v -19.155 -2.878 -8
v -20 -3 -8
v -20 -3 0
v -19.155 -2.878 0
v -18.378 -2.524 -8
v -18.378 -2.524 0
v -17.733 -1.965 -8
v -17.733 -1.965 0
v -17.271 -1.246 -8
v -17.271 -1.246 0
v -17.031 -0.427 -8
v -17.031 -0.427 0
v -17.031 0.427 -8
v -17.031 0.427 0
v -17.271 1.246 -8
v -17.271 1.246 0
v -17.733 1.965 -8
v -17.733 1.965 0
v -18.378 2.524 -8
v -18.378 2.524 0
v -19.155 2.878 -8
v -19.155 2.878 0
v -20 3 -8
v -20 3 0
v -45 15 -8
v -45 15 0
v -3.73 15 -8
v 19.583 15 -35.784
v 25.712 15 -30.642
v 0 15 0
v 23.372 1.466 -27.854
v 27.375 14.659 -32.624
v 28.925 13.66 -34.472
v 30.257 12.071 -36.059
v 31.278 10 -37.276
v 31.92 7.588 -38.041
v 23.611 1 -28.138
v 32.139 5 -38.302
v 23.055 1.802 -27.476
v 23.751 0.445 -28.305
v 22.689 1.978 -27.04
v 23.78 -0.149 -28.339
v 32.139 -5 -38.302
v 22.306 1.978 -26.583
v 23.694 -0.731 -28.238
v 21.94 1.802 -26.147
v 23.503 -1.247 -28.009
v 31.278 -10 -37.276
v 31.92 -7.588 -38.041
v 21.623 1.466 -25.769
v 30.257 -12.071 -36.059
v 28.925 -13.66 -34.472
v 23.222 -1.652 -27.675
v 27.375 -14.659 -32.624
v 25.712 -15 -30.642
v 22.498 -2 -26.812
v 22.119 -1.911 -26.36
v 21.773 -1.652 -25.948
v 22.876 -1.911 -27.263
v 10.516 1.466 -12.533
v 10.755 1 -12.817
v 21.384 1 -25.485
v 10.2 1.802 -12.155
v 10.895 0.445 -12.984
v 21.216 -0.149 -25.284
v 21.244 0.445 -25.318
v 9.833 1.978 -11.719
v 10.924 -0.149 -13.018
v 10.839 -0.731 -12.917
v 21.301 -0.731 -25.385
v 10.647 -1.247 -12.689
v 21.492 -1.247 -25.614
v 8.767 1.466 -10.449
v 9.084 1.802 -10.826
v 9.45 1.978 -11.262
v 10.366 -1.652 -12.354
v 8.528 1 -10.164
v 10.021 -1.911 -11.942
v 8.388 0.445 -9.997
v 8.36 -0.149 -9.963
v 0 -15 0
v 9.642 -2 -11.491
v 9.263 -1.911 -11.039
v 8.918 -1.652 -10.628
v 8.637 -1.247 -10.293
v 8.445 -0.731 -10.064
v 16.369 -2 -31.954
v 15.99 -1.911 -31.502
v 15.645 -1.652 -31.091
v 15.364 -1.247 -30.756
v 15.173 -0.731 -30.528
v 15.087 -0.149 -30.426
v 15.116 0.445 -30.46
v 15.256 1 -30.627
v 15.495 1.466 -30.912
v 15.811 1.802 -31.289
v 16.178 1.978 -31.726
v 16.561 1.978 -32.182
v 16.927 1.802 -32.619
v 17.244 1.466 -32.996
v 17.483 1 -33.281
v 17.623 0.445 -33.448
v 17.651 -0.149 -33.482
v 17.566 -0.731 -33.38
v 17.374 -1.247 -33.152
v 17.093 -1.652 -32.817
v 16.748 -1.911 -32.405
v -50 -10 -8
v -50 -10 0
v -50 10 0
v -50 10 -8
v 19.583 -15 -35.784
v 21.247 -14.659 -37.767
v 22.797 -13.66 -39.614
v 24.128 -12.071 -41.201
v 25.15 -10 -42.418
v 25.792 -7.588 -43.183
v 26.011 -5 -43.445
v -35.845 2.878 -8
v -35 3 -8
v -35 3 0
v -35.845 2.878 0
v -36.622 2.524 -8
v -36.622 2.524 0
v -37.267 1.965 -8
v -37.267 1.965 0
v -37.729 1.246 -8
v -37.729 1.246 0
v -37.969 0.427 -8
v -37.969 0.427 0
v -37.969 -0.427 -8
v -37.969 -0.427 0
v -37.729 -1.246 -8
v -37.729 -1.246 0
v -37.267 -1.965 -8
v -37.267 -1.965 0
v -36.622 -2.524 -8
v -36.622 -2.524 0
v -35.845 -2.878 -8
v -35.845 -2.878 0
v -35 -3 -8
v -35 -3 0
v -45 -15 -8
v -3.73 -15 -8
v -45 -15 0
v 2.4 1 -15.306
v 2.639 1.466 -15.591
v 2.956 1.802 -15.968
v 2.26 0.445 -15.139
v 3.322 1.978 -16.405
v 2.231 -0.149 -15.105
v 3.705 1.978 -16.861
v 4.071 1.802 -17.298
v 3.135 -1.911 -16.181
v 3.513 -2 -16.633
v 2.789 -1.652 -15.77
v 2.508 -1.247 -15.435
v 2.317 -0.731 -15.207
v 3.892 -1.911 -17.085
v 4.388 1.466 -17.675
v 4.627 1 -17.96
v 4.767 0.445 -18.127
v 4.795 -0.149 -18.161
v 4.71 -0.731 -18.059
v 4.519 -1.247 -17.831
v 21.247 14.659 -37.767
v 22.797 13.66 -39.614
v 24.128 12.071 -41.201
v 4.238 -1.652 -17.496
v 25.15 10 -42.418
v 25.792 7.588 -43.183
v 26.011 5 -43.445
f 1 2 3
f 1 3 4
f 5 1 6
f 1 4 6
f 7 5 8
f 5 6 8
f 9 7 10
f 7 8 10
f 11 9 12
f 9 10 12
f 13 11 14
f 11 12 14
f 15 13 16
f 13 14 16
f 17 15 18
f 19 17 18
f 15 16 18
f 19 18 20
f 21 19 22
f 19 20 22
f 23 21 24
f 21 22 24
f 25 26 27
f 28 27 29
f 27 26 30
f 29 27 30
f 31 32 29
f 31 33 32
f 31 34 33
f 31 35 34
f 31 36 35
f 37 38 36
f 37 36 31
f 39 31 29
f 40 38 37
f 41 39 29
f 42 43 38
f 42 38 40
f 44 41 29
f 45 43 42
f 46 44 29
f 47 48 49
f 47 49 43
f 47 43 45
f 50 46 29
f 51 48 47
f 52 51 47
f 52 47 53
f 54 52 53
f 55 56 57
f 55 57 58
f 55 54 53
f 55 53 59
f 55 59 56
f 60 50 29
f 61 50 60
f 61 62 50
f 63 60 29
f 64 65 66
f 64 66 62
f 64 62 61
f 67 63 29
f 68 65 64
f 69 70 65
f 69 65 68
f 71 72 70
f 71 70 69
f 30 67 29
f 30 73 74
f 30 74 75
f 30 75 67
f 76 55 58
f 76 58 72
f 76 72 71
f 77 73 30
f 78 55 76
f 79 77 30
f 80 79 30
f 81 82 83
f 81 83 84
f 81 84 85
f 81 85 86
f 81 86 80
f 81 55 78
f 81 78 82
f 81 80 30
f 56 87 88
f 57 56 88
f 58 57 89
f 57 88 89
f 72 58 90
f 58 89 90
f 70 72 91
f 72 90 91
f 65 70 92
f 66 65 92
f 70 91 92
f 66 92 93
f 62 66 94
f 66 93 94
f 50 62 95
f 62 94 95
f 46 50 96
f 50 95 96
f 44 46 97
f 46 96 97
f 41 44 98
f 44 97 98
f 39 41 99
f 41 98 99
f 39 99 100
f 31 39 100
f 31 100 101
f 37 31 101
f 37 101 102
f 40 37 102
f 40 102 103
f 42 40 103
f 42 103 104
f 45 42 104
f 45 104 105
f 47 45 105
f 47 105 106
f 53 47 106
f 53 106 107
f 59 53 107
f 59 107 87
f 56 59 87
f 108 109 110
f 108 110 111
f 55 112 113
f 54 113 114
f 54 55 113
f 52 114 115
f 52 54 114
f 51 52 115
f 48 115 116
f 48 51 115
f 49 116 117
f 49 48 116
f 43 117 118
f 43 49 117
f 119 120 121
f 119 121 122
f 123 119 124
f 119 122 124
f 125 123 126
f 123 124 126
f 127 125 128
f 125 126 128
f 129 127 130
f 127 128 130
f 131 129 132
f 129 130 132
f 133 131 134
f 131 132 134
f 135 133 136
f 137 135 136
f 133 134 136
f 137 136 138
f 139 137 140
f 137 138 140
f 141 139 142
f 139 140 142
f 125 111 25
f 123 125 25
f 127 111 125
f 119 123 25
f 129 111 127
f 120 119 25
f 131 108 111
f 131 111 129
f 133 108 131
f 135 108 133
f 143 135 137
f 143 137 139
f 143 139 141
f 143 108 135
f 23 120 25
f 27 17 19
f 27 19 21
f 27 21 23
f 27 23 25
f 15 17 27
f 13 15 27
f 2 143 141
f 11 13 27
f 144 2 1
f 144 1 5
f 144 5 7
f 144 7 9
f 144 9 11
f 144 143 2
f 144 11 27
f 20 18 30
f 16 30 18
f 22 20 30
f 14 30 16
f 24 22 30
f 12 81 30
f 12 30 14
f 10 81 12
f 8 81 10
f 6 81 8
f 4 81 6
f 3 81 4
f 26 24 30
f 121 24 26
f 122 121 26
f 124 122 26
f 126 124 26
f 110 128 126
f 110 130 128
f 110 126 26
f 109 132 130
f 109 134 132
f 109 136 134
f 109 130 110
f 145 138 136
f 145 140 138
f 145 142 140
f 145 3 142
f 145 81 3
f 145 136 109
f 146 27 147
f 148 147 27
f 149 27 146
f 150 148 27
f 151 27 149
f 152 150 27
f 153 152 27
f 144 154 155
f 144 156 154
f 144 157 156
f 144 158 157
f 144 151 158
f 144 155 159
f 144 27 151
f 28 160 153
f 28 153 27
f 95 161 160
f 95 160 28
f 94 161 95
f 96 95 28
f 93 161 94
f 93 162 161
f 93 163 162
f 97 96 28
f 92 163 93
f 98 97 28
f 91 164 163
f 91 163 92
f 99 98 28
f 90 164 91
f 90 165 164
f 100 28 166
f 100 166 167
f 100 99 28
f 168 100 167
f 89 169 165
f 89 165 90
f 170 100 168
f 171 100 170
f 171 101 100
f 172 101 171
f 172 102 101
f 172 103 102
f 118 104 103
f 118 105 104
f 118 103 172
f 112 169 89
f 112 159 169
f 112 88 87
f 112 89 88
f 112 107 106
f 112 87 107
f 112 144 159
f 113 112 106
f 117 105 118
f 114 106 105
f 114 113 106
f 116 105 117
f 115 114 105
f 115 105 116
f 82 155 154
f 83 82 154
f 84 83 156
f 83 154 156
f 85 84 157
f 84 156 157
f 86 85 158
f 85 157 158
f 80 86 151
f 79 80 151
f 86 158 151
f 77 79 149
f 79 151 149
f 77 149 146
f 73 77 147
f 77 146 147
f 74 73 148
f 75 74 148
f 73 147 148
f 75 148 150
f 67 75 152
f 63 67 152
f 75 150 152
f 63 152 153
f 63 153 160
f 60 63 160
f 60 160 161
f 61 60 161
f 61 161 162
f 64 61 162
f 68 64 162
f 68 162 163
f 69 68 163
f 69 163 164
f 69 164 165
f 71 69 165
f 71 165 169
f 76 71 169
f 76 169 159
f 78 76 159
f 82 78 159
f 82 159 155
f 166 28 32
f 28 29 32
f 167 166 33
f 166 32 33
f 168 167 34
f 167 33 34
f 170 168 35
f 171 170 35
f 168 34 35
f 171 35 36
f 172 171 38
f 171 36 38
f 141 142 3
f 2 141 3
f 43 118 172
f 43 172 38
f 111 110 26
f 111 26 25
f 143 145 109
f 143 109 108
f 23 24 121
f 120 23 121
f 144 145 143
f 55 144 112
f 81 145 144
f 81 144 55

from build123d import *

# Parameters (mm, degrees)
F1_DEPTH = 15
F3_DEPTH = 43.4455230334
F5_D     = 4
F6_R     = 10
F7_SIZE  = 5


with BuildPart() as f1:
    # F0 (on Front) → F1 (new body, symmetric)
    with BuildSketch(Plane.XZ):
        Polygon((0, 0), (-50, 0), (-50, -8), (-3.7304612652, -8), (26.0110249394, -43.4445230334), (32.1393804843, -38.3022221559), align=None)
    extrude(amount=F1_DEPTH, both=True)

    # F2 (on face) → F3 (cut, through all)
    with BuildSketch(Plane.XY):
        with BuildLine():
            ThreePointArc((-35, 3), (-38, 0), (-35, -3))
            Line((-35, -3), (-20, -3))
            ThreePointArc((-20, -3), (-17, 0), (-20, 3))
            Line((-20, 3), (-35, 3))
        make_face()
    extrude(amount=-F3_DEPTH, mode=Mode.SUBTRACT)

    # F5 (through all)
    with Locations(Plane(origin=(0, 0, 0), x_dir=(0, 1, 0), z_dir=(0.7660444431, 0, 0.6427876097))):
        with Locations((0, -15), (0, -35)):
            Hole(F5_D / 2)

    # F6
    f6_edges = [f1.edges().sort_by_distance(p)[0] for p in [
        (29.075203, 15, -40.873373),
        (29.075203, -15, -40.873373),
    ]]
    fillet(f6_edges, radius=F6_R)

    # F7
    f7_edges = [f1.edges().sort_by_distance(p)[0] for p in [
        (-50, -15, -4),
        (-50, 15, -4),
    ]]
    chamfer(f7_edges, length=F7_SIZE)


solid = f1.part
